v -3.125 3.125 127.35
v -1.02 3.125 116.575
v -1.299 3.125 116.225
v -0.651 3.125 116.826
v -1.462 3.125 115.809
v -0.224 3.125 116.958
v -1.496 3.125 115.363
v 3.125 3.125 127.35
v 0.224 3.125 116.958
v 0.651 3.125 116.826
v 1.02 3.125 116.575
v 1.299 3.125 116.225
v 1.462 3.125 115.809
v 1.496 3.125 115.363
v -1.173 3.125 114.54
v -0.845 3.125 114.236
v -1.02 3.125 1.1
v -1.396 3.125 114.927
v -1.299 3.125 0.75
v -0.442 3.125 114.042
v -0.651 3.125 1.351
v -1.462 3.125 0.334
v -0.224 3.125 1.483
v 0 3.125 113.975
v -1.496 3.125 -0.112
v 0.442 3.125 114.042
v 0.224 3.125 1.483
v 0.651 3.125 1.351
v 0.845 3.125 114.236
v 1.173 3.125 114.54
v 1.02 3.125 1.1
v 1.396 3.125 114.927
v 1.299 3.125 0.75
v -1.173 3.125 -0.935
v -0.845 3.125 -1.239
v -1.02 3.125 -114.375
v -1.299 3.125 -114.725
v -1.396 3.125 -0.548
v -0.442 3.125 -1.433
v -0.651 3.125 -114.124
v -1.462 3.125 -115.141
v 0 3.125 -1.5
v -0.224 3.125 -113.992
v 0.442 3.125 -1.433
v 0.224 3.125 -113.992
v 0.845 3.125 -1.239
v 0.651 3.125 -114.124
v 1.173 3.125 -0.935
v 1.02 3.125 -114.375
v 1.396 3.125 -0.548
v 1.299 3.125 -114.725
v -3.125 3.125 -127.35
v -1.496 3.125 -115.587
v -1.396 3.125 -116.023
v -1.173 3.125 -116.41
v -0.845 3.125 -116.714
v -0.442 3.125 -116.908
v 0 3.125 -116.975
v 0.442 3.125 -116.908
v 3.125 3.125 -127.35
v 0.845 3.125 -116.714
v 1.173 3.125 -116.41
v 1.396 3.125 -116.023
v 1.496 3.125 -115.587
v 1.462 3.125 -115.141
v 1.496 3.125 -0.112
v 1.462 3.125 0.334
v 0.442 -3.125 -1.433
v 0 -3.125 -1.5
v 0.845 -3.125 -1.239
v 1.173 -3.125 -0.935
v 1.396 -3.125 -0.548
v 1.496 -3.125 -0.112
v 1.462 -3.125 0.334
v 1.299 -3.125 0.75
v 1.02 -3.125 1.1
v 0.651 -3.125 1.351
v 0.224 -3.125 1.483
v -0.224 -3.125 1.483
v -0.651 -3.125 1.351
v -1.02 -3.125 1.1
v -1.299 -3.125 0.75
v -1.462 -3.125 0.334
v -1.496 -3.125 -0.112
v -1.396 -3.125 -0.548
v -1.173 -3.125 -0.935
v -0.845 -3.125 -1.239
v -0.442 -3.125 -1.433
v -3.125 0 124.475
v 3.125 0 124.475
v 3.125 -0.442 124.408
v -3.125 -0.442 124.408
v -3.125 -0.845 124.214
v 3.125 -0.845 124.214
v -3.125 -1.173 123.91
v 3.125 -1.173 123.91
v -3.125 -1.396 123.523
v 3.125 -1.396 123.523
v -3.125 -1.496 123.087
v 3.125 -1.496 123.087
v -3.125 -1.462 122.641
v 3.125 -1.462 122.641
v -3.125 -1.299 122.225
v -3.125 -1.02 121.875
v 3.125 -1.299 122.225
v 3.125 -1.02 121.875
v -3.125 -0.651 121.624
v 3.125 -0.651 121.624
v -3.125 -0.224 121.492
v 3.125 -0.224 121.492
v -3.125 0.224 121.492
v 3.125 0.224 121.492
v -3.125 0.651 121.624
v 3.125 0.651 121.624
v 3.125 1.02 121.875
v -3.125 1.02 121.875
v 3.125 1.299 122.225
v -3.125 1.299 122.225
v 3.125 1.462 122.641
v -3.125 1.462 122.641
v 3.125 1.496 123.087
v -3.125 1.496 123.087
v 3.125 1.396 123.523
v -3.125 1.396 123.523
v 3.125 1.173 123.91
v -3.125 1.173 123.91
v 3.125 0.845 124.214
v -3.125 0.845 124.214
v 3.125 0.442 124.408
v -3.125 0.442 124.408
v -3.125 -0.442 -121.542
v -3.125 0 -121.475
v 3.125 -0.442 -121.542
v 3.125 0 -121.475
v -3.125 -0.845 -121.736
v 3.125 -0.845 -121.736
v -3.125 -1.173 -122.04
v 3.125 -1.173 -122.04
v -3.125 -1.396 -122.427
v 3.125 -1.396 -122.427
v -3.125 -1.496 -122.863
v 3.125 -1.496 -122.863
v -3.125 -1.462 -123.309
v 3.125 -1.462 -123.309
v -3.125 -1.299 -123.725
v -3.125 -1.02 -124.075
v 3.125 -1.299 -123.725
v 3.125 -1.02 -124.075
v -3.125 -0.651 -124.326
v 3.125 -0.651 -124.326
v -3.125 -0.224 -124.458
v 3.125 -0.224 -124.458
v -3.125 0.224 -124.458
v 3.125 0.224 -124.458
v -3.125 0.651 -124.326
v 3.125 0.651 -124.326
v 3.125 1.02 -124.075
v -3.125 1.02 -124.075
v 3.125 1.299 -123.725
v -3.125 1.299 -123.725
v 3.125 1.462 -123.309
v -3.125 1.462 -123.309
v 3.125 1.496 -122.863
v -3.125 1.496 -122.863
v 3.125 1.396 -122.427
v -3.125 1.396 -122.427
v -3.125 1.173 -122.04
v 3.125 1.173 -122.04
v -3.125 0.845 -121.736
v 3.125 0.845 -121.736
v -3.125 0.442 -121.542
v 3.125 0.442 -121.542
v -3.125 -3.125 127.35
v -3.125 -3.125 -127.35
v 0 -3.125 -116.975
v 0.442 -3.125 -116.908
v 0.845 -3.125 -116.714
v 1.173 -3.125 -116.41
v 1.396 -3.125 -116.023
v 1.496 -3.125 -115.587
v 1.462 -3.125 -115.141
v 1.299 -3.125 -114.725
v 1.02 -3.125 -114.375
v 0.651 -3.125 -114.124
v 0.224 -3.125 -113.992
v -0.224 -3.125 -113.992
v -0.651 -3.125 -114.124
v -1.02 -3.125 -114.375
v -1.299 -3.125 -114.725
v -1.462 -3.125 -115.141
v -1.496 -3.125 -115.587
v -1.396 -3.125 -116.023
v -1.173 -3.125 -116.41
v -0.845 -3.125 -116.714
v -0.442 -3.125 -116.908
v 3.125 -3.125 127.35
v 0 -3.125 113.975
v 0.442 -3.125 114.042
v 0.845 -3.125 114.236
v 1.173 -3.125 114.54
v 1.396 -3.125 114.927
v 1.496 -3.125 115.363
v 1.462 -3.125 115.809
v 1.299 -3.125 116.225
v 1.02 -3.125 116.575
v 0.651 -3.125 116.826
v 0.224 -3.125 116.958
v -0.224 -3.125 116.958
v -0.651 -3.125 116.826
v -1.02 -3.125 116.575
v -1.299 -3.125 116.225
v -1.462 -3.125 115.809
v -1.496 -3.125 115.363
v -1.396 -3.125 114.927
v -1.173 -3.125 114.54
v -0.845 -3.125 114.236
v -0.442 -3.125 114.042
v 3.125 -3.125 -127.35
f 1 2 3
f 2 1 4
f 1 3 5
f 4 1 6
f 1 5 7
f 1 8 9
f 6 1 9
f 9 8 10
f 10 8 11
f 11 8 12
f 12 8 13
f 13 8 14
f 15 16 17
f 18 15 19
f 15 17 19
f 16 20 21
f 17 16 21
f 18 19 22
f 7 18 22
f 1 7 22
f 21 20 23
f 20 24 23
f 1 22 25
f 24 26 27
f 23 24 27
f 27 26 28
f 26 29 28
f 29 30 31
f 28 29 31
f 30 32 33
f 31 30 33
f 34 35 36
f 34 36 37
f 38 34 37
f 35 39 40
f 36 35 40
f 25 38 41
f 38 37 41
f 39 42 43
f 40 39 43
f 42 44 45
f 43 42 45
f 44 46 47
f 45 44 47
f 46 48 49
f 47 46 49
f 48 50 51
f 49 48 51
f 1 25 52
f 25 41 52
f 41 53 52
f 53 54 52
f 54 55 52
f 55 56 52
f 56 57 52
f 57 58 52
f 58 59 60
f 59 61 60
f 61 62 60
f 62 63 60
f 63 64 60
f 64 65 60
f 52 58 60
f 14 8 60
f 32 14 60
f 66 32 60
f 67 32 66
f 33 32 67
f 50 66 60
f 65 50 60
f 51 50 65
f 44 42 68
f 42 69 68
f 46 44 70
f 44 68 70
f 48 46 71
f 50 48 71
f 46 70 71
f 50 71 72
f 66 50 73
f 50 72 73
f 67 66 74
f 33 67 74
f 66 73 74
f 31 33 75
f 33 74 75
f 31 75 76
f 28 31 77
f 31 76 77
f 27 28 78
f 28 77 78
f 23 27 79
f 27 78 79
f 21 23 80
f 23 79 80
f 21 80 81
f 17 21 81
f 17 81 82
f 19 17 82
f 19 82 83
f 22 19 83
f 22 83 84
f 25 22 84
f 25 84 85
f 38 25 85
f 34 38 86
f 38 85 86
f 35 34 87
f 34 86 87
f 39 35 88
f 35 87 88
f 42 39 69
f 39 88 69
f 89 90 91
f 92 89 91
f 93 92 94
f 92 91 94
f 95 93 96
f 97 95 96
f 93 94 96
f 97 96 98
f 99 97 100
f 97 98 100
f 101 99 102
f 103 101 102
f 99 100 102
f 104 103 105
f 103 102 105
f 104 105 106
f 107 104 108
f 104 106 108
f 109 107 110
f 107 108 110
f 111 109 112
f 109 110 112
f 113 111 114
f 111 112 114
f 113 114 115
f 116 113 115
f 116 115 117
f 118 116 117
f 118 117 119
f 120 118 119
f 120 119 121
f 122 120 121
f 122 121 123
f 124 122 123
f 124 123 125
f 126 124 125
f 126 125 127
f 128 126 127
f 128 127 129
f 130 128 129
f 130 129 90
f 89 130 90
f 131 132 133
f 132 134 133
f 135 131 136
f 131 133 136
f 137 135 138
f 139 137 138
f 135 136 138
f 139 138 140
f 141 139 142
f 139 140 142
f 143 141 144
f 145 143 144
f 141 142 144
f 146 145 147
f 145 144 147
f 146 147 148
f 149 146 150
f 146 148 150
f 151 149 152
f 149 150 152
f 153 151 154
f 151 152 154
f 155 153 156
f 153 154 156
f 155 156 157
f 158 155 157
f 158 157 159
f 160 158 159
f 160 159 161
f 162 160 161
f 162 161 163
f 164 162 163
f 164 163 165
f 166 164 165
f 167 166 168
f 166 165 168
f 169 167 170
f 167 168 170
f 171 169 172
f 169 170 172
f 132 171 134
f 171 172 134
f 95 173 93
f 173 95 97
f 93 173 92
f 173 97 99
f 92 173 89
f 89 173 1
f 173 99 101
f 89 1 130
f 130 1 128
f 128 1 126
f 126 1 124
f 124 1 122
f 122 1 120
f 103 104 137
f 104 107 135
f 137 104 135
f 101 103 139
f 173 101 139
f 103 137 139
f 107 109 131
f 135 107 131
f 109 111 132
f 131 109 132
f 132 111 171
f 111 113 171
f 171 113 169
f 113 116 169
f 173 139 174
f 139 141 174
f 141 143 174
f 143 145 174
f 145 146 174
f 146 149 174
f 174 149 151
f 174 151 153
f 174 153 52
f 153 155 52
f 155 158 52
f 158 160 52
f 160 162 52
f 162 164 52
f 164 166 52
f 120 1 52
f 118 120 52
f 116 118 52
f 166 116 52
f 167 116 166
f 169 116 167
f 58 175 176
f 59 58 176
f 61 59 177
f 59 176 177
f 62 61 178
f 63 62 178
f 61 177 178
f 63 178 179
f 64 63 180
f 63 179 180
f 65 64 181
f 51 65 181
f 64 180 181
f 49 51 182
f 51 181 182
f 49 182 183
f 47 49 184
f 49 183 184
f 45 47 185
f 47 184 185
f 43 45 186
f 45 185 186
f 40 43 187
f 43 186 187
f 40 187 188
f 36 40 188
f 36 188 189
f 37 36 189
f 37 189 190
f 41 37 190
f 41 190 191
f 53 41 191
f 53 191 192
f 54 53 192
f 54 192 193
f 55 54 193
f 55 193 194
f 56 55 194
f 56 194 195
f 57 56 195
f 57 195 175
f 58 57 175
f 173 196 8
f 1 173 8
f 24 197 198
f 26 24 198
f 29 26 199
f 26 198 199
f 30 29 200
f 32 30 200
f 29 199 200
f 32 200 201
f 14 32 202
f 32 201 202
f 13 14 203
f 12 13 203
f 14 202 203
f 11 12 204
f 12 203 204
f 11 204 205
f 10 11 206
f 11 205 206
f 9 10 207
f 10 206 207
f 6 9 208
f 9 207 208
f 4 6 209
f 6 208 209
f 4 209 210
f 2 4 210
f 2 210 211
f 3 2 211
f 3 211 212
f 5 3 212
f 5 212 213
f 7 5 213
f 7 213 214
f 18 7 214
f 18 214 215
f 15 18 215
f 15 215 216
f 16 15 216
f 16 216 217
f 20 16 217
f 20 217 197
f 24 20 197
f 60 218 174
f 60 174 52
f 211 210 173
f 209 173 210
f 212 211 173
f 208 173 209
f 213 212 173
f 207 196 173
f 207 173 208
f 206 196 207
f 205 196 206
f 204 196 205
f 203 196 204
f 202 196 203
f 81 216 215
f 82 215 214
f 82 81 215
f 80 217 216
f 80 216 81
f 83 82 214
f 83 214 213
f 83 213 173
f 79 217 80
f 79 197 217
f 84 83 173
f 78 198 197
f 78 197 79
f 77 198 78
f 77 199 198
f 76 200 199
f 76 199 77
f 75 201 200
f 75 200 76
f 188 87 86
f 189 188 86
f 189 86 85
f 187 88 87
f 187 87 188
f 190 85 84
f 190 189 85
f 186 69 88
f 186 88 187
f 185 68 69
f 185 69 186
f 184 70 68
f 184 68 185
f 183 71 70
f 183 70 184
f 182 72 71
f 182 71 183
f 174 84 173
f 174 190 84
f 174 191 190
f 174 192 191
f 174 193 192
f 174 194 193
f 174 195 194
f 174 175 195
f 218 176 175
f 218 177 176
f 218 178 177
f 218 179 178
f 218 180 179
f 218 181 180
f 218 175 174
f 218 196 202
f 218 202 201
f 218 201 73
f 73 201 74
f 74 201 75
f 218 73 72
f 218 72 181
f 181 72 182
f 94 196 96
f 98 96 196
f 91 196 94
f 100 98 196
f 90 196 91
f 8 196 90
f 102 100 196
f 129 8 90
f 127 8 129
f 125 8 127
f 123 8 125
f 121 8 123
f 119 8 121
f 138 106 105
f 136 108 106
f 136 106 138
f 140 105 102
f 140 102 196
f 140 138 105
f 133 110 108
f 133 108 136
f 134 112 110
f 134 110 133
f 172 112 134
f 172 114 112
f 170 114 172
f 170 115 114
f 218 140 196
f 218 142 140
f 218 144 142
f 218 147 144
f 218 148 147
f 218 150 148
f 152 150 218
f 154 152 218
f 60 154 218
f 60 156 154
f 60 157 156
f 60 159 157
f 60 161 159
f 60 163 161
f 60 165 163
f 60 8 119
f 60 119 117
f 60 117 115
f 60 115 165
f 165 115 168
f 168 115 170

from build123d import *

# Parameters (mm, degrees)
CROQUIS1_W              = 254.7
CROQUIS1_H              = 6.25
SALIENTE_EXTRUIR1_DEPTH = 3.125
CROQUIS2_R              = 1.5
CORTAR_EXTRUIR1_DEPTH   = 20
CROQUIS3_R              = 1.5
CORTAR_EXTRUIR2_DEPTH   = 30


with BuildPart() as part:
    # Croquis1 → Saliente-Extruir1 (new, symmetric)
    with BuildSketch(Plane(origin=(0, 0, 0), x_dir=(0, 0, -1), z_dir=(1, 0, 0))):
        Rectangle(CROQUIS1_W, CROQUIS1_H)
    extrude(amount=SALIENTE_EXTRUIR1_DEPTH, both=True)

    # Croquis2 → Cortar-Extruir1 (cut, symmetric)
    with BuildSketch(Plane(origin=(3.125, 0, 0), x_dir=(0, 0, -1), z_dir=(1, 0, 0))):
        with Locations(Location((-122.975, 0, 0), (0, 0, 180))):
            Circle(CROQUIS2_R)
        with Locations(Location((122.975, 0, 0), (0, 0, 180))):
            Circle(CROQUIS2_R)
    extrude(amount=CORTAR_EXTRUIR1_DEPTH, both=True, mode=Mode.SUBTRACT)

    # Croquis3 → Cortar-Extruir2 (cut, symmetric)
    with BuildSketch(Plane.XZ.offset(3.125)):
        with Locations(Location((0, 115.475, 0), (0, 0, 270))):
            Circle(CROQUIS3_R)
        with Locations(Location((0, -115.475, 0), (0, 0, 270))):
            Circle(CROQUIS3_R)
        with Locations(Location((0, 0, 0), (0, 0, 270))):
            Circle(CROQUIS3_R)
    extrude(amount=CORTAR_EXTRUIR2_DEPTH, both=True, mode=Mode.SUBTRACT)


solid = part.part
